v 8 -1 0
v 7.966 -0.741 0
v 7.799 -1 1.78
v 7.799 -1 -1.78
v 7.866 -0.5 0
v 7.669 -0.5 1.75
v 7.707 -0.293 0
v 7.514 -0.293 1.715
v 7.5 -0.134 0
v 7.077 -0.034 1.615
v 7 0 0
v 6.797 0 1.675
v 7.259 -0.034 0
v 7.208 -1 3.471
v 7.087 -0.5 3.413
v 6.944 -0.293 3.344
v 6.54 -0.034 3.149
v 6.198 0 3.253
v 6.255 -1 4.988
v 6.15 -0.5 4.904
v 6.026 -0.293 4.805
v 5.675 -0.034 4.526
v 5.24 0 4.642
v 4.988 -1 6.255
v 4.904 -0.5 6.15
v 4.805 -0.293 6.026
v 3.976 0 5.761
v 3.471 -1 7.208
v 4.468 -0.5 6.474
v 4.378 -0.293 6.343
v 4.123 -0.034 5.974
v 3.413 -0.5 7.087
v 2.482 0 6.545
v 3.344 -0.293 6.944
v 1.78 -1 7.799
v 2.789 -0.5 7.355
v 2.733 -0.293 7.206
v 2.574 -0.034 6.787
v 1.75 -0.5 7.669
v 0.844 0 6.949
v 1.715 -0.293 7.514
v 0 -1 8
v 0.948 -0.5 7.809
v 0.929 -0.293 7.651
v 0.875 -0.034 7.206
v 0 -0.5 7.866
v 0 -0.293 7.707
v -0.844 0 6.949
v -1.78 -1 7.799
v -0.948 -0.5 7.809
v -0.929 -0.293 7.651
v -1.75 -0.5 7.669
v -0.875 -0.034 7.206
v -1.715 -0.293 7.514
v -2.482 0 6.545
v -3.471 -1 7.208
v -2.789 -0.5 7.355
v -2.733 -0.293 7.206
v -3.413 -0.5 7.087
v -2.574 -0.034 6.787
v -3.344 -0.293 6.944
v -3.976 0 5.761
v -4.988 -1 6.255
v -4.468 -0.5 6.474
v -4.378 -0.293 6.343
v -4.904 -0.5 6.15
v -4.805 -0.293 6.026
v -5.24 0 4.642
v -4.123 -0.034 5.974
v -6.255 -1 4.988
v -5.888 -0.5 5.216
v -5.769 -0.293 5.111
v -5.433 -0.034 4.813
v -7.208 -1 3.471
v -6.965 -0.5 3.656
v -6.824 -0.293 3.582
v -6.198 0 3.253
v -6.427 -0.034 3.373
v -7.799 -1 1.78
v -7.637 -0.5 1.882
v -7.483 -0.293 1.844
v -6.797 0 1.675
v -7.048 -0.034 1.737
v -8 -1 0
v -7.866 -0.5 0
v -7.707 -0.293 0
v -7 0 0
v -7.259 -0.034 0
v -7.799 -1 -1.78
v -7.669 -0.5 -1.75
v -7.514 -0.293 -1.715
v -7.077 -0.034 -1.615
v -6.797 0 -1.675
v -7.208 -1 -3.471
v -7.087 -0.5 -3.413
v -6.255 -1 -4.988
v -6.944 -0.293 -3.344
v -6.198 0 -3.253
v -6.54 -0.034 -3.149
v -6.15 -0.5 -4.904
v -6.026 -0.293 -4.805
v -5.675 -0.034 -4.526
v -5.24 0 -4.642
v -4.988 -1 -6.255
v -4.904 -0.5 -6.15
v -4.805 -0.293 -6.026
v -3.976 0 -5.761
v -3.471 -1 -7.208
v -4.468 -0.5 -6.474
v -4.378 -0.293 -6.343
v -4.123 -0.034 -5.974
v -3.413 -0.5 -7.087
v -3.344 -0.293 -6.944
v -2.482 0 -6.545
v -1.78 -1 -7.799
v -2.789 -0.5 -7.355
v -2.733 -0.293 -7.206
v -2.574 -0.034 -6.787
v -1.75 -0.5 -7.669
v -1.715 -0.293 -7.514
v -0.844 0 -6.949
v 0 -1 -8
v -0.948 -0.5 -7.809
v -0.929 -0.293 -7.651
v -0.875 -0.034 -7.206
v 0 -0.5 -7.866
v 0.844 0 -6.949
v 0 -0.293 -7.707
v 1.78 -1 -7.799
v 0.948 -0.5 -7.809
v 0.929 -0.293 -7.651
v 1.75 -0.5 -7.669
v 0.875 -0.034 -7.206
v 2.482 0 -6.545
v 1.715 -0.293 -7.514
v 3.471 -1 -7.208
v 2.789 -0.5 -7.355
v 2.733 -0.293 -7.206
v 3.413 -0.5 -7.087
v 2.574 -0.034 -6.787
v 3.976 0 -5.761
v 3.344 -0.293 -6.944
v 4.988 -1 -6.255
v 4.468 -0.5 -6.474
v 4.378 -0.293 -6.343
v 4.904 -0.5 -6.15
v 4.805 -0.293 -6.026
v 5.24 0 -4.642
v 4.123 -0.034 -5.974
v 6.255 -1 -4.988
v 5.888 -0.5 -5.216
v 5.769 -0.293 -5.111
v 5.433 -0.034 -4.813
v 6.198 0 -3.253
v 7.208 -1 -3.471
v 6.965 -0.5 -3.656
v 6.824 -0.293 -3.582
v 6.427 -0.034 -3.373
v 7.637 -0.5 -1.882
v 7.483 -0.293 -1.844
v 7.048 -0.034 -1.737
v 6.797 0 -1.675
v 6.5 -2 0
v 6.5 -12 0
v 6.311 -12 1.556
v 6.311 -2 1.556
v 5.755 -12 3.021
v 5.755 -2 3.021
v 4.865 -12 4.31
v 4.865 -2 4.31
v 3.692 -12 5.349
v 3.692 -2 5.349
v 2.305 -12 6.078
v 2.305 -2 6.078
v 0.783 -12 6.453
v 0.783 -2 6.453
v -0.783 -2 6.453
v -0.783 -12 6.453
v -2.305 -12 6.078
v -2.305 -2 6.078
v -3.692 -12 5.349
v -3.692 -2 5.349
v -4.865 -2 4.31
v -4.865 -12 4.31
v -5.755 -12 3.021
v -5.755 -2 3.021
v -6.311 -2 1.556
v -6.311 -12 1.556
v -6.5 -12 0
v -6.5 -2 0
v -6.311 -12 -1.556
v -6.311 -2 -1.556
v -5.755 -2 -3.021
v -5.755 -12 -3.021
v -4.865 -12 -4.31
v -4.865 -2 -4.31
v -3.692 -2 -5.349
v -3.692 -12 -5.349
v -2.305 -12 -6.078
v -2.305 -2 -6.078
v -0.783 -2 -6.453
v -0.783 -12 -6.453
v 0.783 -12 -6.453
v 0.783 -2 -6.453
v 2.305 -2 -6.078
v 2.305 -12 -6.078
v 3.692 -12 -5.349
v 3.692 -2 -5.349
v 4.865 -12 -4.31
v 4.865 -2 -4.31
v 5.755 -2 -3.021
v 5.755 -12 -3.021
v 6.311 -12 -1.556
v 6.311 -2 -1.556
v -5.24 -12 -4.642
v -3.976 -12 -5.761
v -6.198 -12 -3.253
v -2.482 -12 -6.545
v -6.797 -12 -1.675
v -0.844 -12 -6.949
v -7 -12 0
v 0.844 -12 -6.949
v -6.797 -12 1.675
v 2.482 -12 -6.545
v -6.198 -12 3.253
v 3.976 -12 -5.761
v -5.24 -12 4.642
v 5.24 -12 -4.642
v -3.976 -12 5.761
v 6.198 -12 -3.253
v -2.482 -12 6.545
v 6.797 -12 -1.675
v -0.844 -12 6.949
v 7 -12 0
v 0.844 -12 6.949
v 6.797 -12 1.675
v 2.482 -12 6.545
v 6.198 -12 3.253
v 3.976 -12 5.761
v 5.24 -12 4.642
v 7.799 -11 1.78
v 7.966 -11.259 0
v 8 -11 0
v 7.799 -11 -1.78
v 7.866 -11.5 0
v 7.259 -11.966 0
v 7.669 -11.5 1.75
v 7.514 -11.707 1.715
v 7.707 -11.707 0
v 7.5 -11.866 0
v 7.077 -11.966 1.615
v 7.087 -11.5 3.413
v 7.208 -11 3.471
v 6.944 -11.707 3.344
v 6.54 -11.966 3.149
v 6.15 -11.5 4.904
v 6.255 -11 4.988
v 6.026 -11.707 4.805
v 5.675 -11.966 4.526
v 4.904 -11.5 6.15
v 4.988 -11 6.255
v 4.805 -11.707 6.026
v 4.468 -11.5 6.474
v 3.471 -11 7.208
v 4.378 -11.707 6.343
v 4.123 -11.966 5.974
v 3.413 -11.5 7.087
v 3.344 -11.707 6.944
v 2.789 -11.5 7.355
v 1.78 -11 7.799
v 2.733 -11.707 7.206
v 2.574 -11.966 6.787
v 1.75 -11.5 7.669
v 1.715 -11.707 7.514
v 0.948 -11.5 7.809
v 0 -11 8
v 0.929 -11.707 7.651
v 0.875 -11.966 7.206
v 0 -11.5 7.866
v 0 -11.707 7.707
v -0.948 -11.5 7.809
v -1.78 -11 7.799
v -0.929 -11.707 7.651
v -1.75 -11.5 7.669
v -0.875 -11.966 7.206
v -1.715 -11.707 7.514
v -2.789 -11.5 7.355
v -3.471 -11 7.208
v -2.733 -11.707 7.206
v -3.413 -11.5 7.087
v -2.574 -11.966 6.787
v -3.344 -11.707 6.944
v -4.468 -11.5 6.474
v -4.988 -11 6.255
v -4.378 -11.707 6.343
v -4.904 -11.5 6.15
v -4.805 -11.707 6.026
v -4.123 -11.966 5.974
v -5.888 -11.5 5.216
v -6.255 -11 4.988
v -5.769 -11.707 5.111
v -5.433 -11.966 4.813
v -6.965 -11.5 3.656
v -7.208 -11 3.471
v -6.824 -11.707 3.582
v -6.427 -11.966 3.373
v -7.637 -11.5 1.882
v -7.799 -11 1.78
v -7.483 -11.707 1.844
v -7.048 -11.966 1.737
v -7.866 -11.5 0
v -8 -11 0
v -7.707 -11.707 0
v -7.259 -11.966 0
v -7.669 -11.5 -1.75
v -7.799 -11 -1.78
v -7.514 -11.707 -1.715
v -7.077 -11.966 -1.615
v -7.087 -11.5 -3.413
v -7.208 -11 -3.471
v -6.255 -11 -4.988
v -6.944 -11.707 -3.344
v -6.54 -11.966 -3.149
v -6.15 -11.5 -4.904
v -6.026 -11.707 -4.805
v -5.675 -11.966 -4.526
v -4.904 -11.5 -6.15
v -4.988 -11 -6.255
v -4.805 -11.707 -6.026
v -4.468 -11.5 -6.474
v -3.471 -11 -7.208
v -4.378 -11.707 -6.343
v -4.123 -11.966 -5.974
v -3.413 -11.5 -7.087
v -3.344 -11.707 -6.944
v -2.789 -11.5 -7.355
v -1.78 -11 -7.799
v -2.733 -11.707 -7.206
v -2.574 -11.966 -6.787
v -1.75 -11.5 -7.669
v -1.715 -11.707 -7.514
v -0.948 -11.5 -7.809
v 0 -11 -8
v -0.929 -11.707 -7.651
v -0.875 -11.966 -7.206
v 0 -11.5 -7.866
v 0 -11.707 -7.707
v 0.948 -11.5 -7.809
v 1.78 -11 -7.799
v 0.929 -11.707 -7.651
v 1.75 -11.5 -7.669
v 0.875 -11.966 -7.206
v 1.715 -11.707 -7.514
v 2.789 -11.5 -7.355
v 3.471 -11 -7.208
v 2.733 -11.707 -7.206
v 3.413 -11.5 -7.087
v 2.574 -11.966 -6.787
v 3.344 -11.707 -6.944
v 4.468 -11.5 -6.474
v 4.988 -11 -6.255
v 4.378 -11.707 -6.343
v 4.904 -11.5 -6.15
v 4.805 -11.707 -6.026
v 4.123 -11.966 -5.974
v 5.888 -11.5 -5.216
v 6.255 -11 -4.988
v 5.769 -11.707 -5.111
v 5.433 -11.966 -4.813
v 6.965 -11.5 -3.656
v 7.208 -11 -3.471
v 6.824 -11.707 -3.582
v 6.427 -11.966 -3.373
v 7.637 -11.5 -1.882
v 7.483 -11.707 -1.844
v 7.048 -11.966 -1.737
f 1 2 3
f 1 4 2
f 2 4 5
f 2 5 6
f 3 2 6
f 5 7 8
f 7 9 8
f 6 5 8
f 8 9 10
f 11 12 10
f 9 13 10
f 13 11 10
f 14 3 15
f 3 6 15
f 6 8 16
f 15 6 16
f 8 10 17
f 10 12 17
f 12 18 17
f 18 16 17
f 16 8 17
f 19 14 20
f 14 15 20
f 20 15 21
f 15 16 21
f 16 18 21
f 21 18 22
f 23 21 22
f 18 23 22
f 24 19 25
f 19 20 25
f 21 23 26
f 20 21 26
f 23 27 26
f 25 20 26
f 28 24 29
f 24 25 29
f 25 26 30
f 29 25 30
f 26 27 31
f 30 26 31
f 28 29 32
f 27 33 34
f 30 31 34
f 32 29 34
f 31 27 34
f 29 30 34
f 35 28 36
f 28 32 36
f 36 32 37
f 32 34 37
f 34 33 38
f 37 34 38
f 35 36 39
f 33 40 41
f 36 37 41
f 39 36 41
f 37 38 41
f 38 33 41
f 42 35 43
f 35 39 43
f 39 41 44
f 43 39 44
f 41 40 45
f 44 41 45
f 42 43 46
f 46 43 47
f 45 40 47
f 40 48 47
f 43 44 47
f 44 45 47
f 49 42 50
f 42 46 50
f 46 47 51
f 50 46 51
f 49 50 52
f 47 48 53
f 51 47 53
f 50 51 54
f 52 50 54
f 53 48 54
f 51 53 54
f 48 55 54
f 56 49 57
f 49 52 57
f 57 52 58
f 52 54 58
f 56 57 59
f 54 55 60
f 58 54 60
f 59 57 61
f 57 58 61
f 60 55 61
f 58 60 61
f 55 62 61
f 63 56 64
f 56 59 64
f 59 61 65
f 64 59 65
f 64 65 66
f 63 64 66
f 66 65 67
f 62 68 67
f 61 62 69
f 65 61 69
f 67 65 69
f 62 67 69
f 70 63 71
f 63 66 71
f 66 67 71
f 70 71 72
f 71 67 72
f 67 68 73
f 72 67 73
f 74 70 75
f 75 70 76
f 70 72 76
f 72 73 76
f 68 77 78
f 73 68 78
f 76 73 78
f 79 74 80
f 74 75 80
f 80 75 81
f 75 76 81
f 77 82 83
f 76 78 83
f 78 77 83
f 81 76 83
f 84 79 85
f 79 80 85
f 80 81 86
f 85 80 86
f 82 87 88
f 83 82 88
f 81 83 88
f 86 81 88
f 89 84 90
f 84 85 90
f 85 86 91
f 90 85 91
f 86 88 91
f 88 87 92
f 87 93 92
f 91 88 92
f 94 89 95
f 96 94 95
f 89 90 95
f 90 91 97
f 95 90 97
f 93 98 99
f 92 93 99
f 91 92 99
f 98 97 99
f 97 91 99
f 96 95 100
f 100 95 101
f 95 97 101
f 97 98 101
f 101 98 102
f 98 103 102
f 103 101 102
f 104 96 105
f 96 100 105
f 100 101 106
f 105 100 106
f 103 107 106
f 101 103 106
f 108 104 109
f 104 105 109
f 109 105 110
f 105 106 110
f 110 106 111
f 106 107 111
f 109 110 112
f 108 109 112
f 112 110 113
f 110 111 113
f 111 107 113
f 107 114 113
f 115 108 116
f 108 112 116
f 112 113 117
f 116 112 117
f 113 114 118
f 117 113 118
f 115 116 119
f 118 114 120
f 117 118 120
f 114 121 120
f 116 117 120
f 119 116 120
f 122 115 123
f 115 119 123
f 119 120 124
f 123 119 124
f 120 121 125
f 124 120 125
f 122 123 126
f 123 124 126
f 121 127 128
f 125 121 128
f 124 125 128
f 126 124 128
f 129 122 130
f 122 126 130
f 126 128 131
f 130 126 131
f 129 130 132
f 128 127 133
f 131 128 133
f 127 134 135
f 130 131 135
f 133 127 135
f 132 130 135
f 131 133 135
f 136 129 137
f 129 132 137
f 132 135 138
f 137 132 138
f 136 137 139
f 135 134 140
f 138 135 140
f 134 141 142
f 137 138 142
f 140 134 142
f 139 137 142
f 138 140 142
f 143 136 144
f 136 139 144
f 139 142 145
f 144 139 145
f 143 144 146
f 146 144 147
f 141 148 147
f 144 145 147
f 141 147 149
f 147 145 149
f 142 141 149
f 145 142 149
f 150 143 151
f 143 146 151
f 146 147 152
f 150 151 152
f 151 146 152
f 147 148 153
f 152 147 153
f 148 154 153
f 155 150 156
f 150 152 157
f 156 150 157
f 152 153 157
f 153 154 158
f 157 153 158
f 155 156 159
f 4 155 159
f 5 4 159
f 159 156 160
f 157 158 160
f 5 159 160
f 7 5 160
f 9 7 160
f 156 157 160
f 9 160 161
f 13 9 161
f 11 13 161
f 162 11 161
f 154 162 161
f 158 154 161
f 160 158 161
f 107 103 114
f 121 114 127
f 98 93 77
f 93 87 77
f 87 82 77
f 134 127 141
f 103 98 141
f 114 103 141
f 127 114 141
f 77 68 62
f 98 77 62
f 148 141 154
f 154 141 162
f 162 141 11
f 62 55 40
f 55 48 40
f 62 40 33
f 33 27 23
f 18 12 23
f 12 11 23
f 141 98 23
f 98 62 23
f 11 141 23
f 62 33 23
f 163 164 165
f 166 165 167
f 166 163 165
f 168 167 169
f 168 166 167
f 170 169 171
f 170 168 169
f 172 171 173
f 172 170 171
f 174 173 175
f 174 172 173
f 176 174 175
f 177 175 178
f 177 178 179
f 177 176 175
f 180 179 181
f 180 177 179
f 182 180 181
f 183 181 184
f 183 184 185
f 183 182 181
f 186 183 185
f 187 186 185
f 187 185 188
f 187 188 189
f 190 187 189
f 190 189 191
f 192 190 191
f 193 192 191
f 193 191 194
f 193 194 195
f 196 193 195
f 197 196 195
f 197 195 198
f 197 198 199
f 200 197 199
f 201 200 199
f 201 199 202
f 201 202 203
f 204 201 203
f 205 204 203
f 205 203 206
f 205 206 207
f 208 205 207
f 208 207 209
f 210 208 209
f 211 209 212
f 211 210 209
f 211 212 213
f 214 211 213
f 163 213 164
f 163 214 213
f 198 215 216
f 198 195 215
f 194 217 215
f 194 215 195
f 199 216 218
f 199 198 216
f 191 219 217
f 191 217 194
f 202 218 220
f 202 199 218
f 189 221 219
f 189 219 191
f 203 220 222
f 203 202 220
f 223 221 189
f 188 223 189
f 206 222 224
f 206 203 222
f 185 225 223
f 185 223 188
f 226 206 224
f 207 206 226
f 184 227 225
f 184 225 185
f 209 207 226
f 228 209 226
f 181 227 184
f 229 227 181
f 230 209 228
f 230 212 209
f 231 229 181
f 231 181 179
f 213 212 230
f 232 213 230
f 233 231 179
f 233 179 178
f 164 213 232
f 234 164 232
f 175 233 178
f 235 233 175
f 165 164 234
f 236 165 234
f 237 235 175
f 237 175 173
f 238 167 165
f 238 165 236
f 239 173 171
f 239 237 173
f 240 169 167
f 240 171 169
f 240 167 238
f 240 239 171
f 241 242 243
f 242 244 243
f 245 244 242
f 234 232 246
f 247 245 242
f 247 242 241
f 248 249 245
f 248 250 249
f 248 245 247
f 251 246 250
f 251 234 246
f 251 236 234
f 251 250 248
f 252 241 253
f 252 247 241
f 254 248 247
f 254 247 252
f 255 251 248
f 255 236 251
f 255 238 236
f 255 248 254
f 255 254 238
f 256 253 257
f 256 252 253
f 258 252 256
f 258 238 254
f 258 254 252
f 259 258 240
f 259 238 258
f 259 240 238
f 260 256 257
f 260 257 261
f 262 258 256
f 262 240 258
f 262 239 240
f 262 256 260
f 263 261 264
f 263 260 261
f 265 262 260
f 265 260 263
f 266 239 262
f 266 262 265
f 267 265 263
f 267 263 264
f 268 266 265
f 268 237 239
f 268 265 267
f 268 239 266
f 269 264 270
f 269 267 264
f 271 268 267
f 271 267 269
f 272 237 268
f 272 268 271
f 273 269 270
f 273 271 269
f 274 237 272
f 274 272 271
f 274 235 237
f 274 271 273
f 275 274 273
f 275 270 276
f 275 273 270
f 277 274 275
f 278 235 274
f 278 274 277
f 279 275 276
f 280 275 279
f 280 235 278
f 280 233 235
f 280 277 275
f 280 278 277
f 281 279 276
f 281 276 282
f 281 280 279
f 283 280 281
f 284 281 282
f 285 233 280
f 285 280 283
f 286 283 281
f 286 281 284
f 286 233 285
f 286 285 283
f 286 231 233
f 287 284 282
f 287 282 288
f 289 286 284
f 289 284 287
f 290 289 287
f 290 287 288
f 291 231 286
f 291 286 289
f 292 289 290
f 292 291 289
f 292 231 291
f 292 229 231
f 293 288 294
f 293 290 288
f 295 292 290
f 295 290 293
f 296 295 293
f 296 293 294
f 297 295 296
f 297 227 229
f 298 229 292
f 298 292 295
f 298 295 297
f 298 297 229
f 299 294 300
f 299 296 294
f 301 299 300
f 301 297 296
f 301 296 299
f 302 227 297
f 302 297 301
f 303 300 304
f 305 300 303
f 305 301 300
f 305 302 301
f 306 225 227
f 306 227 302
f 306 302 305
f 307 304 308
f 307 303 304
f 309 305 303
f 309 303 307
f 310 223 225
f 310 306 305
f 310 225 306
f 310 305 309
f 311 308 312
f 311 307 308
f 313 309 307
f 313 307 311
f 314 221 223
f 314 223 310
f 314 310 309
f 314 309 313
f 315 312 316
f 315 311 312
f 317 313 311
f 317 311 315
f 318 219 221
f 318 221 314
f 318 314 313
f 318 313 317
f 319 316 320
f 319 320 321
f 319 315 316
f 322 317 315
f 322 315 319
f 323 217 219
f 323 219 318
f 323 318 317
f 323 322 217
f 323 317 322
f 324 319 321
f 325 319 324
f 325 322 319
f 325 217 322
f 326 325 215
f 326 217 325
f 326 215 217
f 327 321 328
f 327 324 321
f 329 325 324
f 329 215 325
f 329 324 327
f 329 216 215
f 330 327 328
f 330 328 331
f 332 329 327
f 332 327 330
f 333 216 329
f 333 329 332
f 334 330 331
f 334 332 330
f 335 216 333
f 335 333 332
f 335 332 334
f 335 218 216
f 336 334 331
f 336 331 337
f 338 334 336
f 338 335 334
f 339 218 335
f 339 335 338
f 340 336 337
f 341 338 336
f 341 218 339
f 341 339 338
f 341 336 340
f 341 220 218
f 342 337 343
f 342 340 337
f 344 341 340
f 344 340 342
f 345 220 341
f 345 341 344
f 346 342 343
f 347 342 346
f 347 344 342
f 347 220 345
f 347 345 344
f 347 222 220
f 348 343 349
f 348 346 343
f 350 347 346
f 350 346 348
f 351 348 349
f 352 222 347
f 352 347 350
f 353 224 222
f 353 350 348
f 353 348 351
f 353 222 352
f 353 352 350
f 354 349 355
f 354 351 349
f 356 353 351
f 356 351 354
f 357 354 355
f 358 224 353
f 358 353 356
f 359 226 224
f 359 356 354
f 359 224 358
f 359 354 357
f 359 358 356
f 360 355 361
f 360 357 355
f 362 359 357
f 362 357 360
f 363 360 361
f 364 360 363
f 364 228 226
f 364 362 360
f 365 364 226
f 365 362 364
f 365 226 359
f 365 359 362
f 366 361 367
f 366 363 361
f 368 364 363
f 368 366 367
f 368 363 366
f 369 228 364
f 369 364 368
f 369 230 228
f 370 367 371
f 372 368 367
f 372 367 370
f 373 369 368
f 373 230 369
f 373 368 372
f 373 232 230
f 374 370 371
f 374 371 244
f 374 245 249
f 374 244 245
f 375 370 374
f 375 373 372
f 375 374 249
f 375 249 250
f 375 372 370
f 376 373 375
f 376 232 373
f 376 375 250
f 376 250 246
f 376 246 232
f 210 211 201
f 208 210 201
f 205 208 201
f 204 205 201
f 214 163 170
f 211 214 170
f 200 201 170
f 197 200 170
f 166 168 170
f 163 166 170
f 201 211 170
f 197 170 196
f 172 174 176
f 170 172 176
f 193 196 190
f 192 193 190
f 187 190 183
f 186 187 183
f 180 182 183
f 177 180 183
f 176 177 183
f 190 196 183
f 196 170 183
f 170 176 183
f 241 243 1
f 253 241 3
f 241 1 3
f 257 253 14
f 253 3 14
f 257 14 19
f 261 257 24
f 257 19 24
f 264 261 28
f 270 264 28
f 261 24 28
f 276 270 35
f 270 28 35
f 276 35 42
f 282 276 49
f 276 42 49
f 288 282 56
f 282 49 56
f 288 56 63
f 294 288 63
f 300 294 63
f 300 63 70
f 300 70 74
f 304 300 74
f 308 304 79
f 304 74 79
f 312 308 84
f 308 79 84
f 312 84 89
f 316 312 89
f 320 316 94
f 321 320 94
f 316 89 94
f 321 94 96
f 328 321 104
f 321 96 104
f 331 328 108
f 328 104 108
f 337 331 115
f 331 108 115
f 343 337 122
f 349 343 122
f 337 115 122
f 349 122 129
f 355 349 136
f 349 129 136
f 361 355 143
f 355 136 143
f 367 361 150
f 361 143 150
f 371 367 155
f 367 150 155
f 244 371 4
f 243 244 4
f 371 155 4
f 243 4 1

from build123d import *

# Parameters (mm, degrees)
F0_R     = 8
F0_R_2   = 6.5
F1_DEPTH = 12
F2_R     = 1
F3_R     = 7
F3_R_2   = 6.5
F4_DEPTH = 2


with BuildPart() as f1:
    # F0 (on Front) → F1 (new body)
    with BuildSketch(Plane.XZ):
        Circle(F0_R)
        Circle(F0_R_2, mode=Mode.SUBTRACT)
    extrude(amount=F1_DEPTH)

    # F2
    f2_edges = [f1.edges().sort_by_distance(p)[0] for p in [
        (-8, -12, 0),
        (-8, 0, 0),
    ]]
    fillet(f2_edges, radius=F2_R)

    # F3 (on face) → F4 (join)
    with BuildSketch(Plane(origin=(0, 0, 0), x_dir=(-1, 0, 0), z_dir=(0, 1, 0))):
        Circle(F3_R)
        Circle(F3_R_2, mode=Mode.SUBTRACT)
        Circle(F3_R_2)
    extrude(amount=-F4_DEPTH)


solid = f1.part
